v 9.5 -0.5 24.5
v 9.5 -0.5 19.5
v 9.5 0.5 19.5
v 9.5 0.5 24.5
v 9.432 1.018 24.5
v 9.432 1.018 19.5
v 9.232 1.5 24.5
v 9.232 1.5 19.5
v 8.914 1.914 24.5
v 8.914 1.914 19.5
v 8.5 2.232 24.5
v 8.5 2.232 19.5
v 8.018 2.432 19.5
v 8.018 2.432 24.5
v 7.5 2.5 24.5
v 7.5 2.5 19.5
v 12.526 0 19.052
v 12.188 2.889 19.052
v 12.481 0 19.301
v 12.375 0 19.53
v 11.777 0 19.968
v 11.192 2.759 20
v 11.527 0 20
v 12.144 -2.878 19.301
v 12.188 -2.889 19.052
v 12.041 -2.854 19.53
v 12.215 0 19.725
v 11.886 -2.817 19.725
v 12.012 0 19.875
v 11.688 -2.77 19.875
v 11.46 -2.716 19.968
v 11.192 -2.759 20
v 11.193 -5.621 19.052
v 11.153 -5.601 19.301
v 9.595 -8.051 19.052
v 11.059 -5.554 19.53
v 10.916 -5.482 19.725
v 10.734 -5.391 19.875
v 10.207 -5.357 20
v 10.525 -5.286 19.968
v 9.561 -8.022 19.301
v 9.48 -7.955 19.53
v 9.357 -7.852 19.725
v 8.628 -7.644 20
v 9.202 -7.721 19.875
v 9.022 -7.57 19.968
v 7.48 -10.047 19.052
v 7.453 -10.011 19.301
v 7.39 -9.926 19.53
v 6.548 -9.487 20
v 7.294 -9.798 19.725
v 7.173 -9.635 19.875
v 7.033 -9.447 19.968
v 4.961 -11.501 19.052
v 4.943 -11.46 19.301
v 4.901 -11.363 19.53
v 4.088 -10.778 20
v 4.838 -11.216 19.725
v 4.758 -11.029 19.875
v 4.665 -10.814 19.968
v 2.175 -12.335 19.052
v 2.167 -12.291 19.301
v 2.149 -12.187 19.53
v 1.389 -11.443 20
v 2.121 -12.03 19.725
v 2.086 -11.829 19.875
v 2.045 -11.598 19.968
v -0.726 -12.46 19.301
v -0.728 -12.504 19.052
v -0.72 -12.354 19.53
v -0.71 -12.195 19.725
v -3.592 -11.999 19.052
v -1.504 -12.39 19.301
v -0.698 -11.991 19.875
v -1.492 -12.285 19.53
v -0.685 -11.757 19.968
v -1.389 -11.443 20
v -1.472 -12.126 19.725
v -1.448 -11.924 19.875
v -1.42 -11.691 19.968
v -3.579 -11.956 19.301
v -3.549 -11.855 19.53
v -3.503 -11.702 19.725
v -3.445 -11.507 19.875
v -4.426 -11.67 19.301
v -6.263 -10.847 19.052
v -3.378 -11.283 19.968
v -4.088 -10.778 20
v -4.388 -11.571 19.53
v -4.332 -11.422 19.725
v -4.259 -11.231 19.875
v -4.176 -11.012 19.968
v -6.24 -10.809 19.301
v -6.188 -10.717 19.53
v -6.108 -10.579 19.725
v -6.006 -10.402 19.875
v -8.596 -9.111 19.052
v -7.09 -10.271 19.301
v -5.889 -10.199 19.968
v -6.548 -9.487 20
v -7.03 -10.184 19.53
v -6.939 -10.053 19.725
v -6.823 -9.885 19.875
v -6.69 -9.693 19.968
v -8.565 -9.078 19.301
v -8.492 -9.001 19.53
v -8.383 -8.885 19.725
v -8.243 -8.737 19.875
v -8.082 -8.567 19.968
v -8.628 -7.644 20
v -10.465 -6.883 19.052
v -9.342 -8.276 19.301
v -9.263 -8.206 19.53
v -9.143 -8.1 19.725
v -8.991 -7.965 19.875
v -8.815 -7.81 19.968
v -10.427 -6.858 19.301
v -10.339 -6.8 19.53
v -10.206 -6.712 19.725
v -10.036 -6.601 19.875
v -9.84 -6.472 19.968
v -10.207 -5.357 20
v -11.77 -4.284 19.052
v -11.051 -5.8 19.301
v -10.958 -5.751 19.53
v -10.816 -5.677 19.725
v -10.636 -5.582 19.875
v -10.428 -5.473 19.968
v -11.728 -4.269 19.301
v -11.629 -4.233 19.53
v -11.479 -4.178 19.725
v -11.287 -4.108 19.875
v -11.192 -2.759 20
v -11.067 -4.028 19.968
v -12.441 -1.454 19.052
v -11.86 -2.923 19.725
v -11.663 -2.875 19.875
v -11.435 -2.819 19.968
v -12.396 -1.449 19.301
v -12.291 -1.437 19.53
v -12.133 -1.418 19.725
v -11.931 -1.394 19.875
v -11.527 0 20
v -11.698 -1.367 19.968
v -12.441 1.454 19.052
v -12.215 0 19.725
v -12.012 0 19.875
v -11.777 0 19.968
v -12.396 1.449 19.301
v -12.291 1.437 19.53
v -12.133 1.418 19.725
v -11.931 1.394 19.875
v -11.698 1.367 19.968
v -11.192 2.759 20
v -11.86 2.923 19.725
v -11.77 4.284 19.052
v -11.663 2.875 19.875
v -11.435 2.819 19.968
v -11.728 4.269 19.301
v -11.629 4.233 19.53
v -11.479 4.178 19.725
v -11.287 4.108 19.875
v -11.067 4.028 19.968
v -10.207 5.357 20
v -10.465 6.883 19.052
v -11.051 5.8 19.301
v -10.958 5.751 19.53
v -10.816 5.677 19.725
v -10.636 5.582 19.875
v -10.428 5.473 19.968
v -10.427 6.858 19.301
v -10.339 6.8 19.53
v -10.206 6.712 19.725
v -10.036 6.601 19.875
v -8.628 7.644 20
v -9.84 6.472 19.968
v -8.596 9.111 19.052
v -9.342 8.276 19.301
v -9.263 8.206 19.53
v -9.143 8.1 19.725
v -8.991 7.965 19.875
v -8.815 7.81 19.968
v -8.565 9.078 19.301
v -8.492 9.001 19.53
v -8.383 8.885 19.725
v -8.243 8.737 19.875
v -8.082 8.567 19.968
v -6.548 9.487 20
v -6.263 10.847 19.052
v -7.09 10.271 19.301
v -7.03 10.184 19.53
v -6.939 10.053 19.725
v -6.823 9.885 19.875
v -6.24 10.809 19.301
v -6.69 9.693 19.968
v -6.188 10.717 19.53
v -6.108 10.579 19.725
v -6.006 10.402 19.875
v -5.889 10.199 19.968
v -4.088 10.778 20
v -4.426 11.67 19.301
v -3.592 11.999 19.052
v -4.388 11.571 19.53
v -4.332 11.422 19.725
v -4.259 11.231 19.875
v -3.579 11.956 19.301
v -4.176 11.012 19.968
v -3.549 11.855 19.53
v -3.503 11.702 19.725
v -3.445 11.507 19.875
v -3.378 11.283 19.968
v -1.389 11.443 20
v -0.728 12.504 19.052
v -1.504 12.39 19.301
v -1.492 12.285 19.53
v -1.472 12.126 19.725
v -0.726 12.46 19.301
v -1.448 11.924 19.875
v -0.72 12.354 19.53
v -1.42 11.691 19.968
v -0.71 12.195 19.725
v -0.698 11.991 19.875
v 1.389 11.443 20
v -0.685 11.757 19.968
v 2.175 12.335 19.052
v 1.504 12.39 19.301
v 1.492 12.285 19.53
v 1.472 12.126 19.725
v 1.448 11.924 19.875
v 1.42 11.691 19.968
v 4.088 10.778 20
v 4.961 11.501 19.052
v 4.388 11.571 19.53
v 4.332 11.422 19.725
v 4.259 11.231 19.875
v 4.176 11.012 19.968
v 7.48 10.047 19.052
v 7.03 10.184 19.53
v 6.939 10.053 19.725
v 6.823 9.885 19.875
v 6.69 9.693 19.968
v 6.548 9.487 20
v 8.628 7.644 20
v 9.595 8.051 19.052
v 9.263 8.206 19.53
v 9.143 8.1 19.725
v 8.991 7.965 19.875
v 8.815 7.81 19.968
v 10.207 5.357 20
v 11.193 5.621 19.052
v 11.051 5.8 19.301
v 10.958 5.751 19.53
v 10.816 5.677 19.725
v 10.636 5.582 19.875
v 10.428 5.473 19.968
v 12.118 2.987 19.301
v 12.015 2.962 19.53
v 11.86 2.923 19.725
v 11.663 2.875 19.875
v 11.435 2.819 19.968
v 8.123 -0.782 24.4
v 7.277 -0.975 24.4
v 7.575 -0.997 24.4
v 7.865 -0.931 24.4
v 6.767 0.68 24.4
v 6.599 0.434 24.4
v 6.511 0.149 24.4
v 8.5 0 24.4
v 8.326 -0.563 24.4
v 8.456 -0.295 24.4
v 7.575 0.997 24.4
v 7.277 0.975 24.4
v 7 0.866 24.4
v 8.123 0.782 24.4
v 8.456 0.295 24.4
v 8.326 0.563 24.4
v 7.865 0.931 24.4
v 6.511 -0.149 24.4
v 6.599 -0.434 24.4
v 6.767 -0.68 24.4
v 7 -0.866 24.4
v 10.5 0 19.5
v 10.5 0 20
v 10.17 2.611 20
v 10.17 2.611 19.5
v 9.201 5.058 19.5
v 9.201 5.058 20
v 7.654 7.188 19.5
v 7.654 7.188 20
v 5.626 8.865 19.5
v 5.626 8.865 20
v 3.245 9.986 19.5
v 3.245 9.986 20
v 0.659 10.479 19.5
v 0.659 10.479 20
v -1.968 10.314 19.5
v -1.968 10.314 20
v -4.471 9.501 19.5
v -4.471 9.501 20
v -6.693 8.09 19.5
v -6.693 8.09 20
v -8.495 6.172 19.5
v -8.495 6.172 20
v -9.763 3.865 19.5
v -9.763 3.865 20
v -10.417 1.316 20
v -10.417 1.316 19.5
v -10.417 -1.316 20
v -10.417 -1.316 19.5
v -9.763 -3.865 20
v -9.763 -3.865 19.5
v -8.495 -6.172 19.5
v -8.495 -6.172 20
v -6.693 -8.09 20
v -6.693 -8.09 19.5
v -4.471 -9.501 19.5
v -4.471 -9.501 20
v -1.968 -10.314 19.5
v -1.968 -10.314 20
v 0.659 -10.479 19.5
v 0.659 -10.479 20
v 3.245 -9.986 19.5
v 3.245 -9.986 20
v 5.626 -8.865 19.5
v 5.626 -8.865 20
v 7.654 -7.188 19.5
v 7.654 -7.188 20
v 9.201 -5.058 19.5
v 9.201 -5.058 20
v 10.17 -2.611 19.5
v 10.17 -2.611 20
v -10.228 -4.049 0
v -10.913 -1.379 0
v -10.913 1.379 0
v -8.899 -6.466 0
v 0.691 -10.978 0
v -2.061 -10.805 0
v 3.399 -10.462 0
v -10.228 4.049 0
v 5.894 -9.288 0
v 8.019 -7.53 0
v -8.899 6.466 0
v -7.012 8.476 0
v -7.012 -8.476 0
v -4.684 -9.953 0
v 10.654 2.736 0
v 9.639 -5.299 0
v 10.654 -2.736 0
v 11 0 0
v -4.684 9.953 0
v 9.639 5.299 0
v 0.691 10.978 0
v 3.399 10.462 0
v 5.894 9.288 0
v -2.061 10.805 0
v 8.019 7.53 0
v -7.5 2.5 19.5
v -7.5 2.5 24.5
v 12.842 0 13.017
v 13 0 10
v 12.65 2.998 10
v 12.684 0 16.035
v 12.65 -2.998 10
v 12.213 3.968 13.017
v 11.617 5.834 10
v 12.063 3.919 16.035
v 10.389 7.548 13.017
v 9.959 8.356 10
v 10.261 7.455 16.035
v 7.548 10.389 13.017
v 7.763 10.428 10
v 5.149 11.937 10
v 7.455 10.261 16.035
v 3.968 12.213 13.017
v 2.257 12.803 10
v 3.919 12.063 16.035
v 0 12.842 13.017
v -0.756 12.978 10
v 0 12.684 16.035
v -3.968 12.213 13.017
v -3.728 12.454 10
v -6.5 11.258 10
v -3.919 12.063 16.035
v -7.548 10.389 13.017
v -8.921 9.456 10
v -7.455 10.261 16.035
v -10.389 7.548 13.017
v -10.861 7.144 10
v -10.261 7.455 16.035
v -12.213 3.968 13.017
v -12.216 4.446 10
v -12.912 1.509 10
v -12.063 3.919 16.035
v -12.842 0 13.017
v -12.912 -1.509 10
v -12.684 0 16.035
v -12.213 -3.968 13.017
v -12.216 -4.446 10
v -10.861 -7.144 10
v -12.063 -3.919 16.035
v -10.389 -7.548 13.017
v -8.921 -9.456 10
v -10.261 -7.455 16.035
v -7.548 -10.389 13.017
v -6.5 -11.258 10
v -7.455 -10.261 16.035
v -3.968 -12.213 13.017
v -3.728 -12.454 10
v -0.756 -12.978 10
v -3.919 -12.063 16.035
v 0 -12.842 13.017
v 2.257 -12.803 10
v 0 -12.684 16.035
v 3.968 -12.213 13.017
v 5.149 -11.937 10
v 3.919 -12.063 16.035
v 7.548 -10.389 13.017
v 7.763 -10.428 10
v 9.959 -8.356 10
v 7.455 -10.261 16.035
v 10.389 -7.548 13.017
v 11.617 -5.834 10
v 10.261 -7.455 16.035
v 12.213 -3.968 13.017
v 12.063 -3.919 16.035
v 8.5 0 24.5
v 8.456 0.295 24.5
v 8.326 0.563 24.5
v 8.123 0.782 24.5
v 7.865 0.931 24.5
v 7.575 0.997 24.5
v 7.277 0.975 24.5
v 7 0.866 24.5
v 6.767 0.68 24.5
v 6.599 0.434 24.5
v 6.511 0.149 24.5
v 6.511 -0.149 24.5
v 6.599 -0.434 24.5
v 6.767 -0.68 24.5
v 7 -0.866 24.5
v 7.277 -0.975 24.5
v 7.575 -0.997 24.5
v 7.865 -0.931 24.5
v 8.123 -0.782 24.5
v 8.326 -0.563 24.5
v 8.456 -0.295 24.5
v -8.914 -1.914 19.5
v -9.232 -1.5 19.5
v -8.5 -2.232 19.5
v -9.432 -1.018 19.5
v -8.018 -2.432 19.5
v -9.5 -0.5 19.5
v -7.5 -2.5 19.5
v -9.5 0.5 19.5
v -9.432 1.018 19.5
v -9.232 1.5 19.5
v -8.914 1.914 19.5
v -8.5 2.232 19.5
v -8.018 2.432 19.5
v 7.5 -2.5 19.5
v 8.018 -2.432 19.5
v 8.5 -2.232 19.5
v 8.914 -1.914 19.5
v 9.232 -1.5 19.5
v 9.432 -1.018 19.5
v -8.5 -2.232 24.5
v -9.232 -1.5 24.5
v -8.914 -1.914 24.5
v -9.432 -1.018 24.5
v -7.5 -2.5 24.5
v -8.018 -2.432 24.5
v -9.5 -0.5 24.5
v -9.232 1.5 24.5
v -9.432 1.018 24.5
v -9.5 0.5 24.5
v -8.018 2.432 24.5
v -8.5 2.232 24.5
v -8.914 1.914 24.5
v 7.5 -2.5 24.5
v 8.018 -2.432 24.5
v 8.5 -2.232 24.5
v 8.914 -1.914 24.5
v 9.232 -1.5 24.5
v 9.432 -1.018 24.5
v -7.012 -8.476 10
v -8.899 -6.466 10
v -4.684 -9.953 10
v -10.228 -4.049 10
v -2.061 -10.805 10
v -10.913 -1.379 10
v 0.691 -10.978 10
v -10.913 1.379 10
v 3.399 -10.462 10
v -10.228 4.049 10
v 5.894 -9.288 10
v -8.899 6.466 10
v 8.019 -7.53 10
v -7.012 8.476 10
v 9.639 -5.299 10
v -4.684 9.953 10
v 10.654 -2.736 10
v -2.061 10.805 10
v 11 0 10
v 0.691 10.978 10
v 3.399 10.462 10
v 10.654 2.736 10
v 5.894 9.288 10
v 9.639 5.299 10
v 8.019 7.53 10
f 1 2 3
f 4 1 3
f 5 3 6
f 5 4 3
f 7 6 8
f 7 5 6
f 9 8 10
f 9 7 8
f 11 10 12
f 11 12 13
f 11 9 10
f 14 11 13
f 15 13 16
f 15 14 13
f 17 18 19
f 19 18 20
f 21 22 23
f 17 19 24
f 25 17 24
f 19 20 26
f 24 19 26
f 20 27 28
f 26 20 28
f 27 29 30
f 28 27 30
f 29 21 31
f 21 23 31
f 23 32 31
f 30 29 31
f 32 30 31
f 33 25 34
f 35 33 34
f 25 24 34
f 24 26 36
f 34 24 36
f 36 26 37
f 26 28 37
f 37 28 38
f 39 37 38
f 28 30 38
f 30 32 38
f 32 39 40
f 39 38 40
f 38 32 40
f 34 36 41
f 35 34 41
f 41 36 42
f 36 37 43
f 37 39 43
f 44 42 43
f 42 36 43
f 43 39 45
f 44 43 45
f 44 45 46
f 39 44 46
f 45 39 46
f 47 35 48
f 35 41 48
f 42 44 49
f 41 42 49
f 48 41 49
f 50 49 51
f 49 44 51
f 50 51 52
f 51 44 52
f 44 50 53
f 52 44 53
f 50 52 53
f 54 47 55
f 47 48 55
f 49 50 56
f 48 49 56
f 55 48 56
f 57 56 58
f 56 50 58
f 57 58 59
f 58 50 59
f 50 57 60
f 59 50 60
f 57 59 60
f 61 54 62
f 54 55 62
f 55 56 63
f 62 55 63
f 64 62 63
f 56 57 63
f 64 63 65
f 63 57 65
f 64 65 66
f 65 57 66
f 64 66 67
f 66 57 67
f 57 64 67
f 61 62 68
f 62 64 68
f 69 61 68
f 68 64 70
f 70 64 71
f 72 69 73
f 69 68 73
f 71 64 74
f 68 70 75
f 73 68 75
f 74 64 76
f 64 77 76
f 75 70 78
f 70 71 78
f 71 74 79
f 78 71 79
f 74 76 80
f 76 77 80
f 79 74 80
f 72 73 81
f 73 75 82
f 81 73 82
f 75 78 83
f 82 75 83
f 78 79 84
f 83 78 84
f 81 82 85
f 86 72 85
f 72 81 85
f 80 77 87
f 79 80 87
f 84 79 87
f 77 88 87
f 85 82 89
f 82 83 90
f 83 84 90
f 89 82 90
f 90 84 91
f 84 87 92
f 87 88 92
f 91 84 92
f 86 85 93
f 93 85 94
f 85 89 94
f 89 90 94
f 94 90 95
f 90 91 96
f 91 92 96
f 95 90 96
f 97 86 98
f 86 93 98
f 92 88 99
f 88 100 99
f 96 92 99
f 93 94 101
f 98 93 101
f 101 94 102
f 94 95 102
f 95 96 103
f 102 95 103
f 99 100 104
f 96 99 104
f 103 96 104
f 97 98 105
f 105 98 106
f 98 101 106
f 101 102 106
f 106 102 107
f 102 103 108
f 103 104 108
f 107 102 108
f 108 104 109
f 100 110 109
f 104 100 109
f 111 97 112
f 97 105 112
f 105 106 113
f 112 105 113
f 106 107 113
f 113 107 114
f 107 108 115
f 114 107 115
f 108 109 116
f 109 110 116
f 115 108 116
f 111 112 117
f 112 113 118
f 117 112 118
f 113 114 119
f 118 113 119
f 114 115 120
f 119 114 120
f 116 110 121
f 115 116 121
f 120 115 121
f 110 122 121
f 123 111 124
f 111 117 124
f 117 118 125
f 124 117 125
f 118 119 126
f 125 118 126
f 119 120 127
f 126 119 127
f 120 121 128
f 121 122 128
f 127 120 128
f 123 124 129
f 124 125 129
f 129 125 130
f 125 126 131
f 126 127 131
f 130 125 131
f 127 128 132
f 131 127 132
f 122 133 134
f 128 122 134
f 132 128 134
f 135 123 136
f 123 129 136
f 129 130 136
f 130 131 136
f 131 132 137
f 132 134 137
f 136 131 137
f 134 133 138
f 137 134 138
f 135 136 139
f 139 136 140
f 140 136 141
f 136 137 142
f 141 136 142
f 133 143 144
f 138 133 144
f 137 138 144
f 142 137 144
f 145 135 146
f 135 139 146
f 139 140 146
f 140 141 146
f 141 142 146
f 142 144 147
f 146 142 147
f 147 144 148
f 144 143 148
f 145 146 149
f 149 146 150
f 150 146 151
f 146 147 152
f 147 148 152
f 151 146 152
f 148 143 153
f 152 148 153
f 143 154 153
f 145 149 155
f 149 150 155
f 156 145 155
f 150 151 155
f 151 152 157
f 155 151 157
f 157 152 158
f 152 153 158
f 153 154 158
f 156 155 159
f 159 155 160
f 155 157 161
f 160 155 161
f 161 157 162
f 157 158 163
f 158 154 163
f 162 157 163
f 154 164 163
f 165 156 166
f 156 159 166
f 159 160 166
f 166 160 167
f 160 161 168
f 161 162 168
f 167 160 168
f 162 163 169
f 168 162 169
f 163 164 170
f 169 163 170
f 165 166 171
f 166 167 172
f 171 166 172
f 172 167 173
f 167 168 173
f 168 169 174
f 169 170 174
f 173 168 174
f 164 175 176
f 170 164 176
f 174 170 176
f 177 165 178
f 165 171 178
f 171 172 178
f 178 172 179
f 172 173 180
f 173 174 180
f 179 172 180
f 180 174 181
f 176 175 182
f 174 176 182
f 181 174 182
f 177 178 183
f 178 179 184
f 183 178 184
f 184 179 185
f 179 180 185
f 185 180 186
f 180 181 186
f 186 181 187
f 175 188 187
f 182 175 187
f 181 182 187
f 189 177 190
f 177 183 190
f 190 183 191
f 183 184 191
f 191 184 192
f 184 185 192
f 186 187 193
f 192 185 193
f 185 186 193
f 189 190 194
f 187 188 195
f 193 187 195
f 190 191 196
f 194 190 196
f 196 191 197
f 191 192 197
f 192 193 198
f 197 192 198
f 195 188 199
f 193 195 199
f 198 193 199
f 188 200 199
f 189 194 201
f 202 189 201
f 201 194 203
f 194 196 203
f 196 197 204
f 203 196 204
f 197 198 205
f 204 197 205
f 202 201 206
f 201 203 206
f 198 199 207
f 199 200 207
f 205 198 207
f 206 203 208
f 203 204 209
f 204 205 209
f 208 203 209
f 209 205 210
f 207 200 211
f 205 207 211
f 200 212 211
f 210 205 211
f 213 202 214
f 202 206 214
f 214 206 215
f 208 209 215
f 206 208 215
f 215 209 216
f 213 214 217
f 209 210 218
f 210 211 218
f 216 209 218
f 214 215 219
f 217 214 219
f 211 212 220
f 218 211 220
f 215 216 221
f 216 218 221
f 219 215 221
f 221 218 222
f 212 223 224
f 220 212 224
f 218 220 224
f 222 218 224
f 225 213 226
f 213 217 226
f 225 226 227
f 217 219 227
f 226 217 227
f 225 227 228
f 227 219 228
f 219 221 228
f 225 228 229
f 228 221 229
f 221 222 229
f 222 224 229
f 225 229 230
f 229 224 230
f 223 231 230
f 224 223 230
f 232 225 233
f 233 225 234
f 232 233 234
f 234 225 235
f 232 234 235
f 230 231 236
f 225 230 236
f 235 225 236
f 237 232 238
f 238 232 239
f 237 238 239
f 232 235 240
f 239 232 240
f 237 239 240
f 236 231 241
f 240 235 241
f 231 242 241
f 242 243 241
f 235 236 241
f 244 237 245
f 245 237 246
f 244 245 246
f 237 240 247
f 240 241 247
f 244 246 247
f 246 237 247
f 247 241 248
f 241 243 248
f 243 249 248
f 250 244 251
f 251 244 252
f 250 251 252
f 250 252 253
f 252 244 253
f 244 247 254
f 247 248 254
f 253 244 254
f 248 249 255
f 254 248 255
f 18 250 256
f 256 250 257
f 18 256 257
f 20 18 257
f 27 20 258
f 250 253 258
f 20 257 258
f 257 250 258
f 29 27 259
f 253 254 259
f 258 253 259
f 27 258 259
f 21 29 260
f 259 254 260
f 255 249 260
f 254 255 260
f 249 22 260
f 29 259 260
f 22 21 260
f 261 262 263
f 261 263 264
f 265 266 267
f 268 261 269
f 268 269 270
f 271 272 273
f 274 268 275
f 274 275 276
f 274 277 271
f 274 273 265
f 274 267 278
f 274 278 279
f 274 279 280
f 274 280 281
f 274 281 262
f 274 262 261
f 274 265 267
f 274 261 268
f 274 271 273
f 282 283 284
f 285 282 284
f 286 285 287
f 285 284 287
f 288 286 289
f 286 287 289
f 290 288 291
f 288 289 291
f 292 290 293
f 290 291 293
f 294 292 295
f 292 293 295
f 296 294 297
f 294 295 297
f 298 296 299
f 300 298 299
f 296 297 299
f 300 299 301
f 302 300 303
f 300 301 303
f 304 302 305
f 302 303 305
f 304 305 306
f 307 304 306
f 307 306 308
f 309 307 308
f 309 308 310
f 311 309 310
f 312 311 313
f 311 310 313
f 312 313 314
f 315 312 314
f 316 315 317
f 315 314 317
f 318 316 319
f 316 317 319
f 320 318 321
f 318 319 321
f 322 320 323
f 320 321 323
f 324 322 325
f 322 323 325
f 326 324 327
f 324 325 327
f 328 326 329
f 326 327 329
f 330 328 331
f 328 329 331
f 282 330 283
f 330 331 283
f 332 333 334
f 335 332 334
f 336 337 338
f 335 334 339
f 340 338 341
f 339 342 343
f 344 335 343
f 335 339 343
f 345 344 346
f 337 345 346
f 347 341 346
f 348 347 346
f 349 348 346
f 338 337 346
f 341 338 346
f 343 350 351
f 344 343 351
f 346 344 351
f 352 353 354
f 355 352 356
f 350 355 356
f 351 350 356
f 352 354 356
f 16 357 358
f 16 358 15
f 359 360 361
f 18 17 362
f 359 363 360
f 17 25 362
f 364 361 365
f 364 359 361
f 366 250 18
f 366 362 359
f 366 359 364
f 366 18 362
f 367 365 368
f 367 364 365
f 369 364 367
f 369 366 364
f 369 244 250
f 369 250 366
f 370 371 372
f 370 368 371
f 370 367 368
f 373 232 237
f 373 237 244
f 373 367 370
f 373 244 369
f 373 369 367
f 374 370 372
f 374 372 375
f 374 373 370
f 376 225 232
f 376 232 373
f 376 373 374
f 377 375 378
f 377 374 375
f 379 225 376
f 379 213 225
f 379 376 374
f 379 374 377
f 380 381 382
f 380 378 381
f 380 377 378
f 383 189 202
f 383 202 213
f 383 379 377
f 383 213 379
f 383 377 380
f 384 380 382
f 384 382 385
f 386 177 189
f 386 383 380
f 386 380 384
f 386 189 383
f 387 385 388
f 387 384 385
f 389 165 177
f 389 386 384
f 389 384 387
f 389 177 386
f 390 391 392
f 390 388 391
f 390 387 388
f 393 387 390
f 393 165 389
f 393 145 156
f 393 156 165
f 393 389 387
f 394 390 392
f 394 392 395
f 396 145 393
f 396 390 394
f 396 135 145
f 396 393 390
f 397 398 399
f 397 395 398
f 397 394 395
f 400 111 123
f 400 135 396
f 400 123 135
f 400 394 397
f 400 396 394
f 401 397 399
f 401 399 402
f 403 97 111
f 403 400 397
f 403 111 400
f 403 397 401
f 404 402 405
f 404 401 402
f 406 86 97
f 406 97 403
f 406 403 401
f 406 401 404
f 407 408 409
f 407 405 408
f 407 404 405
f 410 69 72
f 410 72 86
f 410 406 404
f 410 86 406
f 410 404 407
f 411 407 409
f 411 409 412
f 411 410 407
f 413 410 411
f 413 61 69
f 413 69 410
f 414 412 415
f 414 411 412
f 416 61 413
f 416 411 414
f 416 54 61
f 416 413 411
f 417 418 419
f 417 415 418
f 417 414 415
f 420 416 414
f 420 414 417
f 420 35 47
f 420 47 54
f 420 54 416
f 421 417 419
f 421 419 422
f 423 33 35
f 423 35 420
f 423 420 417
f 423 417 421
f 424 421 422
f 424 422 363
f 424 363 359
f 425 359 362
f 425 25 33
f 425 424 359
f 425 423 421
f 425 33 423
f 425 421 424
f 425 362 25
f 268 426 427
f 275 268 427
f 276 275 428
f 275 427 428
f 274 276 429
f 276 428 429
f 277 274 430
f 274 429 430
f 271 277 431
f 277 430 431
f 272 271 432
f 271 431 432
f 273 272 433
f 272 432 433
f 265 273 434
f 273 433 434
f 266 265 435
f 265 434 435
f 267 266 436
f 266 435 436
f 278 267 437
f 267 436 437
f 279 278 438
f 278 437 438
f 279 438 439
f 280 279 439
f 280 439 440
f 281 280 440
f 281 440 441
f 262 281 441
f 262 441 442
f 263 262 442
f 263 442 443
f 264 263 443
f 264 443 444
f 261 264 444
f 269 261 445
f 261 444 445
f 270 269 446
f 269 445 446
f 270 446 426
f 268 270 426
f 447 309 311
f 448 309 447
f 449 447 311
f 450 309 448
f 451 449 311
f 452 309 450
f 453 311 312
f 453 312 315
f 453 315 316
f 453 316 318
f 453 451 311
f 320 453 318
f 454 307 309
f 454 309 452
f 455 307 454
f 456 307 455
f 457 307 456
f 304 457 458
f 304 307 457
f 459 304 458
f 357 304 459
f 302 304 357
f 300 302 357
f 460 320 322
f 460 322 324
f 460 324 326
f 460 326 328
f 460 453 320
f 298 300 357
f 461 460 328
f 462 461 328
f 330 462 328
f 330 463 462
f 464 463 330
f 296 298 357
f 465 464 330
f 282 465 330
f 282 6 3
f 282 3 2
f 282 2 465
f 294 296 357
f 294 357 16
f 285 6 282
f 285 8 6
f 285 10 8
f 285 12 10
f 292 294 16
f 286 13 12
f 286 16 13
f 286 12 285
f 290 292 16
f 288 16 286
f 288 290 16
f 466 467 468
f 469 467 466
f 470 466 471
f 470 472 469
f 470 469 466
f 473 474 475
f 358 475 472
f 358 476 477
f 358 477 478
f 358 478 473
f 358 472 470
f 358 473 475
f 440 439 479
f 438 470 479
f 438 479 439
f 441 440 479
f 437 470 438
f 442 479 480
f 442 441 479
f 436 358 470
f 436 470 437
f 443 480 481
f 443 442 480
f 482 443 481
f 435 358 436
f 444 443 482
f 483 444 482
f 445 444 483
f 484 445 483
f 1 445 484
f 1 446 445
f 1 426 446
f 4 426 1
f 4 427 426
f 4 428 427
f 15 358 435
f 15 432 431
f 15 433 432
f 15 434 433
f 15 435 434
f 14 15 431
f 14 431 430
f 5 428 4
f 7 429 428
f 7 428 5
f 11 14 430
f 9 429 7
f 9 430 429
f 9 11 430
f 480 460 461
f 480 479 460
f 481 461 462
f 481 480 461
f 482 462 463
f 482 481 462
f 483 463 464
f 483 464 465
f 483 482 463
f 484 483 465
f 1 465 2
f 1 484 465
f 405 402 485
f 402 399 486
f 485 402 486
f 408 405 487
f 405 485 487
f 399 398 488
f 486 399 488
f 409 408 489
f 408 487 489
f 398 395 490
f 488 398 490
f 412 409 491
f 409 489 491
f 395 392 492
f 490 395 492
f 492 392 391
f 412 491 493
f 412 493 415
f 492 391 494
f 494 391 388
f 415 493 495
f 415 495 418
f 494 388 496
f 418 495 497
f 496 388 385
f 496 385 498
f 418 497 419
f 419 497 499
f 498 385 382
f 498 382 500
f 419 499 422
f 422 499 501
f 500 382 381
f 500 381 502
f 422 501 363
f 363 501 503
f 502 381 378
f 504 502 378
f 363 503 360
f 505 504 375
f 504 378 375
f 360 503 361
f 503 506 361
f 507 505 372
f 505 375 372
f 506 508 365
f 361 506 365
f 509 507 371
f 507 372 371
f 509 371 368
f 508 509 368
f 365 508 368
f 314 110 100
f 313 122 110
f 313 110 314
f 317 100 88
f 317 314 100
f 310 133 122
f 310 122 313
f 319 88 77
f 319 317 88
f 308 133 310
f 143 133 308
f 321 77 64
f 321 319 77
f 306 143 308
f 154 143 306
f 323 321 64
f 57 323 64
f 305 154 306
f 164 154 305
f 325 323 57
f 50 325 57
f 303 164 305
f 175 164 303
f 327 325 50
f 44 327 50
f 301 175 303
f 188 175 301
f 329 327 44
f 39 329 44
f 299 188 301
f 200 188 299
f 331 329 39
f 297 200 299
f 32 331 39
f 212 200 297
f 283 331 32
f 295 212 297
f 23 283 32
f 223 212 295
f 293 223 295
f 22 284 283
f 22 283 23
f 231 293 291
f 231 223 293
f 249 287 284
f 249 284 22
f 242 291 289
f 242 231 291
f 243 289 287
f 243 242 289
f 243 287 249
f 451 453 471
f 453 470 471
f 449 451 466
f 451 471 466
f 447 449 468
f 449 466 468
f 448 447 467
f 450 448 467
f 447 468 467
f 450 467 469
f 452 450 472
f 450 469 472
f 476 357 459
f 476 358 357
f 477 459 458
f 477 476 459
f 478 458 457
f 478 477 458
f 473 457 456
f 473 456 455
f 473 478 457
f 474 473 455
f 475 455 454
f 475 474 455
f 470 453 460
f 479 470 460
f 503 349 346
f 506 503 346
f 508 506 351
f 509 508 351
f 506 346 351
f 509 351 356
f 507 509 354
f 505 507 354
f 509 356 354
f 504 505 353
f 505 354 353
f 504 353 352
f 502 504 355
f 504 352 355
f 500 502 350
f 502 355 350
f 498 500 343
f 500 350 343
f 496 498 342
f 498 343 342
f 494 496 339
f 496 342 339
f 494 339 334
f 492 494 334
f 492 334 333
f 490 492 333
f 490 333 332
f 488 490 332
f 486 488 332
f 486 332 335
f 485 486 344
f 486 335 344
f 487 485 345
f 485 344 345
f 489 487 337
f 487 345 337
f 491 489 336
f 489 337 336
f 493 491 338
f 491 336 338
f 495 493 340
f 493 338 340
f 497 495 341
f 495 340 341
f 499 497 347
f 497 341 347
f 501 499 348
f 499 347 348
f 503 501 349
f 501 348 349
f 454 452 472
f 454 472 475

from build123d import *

# Parameters (mm, degrees)
SKETCH_1_R          = 11
EXTRUDE_1_DEPTH     = 10
SKETCH_2_R          = 13
EXTRUDE_2_DEPTH     = 10
EXTRUDE_2_TAPER     = 3
FILLET_1_R          = 1
SKETCH_3_R          = 10.5
CUT_EXTRUDE_1_DEPTH = 0.5
SKETCH_4_W          = 19
SKETCH_4_H          = 5
EXTRUDE_4_DEPTH     = 5
FILLET_3_R          = 2
SKETCH_5_R          = 1
CUT_EXTRUDE_2_DEPTH = 0.1


with BuildPart() as part:
    # 草图1 → 凸台-拉伸1 (new body)
    with BuildSketch(Plane.XY):
        Circle(SKETCH_1_R)
    extrude(amount=EXTRUDE_1_DEPTH)

    # 草图2 → 凸台-拉伸2 (add)
    with BuildSketch(Plane.XY.offset(10)):
        Circle(SKETCH_2_R)
    extrude(amount=EXTRUDE_2_DEPTH, taper=EXTRUDE_2_TAPER)

    # 圆角1
    fillet_1_edges = [part.edges().sort_by_distance(p)[0] for p in [
        (-12.475922207, 0, 20),
    ]]
    fillet(fillet_1_edges, radius=FILLET_1_R)

    # 草图3 → 切除-拉伸1 (cut)
    with BuildSketch(Plane.XY.offset(20)):
        Circle(SKETCH_3_R)
    extrude(amount=-CUT_EXTRUDE_1_DEPTH, mode=Mode.SUBTRACT)

    # 草图4 → 凸台-拉伸4 (add)
    with BuildSketch(Plane.XY.offset(19.5)):
        Rectangle(SKETCH_4_W, SKETCH_4_H)
    extrude(amount=EXTRUDE_4_DEPTH)

    # 圆角3
    fillet_3_edges = [part.edges().sort_by_distance(p)[0] for p in [
        (-9.5, 2.5, 22),
        (-9.5, -2.5, 22),
        (9.5, -2.5, 22),
        (9.5, 2.5, 22),
    ]]
    fillet(fillet_3_edges, radius=FILLET_3_R)

    # 草图5 → 切除-拉伸2 (cut)
    with BuildSketch(Plane.XY.offset(24.5)):
        with Locations((7.5, 0)):
            Circle(SKETCH_5_R)
    extrude(amount=-CUT_EXTRUDE_2_DEPTH, mode=Mode.SUBTRACT)


solid = part.part
